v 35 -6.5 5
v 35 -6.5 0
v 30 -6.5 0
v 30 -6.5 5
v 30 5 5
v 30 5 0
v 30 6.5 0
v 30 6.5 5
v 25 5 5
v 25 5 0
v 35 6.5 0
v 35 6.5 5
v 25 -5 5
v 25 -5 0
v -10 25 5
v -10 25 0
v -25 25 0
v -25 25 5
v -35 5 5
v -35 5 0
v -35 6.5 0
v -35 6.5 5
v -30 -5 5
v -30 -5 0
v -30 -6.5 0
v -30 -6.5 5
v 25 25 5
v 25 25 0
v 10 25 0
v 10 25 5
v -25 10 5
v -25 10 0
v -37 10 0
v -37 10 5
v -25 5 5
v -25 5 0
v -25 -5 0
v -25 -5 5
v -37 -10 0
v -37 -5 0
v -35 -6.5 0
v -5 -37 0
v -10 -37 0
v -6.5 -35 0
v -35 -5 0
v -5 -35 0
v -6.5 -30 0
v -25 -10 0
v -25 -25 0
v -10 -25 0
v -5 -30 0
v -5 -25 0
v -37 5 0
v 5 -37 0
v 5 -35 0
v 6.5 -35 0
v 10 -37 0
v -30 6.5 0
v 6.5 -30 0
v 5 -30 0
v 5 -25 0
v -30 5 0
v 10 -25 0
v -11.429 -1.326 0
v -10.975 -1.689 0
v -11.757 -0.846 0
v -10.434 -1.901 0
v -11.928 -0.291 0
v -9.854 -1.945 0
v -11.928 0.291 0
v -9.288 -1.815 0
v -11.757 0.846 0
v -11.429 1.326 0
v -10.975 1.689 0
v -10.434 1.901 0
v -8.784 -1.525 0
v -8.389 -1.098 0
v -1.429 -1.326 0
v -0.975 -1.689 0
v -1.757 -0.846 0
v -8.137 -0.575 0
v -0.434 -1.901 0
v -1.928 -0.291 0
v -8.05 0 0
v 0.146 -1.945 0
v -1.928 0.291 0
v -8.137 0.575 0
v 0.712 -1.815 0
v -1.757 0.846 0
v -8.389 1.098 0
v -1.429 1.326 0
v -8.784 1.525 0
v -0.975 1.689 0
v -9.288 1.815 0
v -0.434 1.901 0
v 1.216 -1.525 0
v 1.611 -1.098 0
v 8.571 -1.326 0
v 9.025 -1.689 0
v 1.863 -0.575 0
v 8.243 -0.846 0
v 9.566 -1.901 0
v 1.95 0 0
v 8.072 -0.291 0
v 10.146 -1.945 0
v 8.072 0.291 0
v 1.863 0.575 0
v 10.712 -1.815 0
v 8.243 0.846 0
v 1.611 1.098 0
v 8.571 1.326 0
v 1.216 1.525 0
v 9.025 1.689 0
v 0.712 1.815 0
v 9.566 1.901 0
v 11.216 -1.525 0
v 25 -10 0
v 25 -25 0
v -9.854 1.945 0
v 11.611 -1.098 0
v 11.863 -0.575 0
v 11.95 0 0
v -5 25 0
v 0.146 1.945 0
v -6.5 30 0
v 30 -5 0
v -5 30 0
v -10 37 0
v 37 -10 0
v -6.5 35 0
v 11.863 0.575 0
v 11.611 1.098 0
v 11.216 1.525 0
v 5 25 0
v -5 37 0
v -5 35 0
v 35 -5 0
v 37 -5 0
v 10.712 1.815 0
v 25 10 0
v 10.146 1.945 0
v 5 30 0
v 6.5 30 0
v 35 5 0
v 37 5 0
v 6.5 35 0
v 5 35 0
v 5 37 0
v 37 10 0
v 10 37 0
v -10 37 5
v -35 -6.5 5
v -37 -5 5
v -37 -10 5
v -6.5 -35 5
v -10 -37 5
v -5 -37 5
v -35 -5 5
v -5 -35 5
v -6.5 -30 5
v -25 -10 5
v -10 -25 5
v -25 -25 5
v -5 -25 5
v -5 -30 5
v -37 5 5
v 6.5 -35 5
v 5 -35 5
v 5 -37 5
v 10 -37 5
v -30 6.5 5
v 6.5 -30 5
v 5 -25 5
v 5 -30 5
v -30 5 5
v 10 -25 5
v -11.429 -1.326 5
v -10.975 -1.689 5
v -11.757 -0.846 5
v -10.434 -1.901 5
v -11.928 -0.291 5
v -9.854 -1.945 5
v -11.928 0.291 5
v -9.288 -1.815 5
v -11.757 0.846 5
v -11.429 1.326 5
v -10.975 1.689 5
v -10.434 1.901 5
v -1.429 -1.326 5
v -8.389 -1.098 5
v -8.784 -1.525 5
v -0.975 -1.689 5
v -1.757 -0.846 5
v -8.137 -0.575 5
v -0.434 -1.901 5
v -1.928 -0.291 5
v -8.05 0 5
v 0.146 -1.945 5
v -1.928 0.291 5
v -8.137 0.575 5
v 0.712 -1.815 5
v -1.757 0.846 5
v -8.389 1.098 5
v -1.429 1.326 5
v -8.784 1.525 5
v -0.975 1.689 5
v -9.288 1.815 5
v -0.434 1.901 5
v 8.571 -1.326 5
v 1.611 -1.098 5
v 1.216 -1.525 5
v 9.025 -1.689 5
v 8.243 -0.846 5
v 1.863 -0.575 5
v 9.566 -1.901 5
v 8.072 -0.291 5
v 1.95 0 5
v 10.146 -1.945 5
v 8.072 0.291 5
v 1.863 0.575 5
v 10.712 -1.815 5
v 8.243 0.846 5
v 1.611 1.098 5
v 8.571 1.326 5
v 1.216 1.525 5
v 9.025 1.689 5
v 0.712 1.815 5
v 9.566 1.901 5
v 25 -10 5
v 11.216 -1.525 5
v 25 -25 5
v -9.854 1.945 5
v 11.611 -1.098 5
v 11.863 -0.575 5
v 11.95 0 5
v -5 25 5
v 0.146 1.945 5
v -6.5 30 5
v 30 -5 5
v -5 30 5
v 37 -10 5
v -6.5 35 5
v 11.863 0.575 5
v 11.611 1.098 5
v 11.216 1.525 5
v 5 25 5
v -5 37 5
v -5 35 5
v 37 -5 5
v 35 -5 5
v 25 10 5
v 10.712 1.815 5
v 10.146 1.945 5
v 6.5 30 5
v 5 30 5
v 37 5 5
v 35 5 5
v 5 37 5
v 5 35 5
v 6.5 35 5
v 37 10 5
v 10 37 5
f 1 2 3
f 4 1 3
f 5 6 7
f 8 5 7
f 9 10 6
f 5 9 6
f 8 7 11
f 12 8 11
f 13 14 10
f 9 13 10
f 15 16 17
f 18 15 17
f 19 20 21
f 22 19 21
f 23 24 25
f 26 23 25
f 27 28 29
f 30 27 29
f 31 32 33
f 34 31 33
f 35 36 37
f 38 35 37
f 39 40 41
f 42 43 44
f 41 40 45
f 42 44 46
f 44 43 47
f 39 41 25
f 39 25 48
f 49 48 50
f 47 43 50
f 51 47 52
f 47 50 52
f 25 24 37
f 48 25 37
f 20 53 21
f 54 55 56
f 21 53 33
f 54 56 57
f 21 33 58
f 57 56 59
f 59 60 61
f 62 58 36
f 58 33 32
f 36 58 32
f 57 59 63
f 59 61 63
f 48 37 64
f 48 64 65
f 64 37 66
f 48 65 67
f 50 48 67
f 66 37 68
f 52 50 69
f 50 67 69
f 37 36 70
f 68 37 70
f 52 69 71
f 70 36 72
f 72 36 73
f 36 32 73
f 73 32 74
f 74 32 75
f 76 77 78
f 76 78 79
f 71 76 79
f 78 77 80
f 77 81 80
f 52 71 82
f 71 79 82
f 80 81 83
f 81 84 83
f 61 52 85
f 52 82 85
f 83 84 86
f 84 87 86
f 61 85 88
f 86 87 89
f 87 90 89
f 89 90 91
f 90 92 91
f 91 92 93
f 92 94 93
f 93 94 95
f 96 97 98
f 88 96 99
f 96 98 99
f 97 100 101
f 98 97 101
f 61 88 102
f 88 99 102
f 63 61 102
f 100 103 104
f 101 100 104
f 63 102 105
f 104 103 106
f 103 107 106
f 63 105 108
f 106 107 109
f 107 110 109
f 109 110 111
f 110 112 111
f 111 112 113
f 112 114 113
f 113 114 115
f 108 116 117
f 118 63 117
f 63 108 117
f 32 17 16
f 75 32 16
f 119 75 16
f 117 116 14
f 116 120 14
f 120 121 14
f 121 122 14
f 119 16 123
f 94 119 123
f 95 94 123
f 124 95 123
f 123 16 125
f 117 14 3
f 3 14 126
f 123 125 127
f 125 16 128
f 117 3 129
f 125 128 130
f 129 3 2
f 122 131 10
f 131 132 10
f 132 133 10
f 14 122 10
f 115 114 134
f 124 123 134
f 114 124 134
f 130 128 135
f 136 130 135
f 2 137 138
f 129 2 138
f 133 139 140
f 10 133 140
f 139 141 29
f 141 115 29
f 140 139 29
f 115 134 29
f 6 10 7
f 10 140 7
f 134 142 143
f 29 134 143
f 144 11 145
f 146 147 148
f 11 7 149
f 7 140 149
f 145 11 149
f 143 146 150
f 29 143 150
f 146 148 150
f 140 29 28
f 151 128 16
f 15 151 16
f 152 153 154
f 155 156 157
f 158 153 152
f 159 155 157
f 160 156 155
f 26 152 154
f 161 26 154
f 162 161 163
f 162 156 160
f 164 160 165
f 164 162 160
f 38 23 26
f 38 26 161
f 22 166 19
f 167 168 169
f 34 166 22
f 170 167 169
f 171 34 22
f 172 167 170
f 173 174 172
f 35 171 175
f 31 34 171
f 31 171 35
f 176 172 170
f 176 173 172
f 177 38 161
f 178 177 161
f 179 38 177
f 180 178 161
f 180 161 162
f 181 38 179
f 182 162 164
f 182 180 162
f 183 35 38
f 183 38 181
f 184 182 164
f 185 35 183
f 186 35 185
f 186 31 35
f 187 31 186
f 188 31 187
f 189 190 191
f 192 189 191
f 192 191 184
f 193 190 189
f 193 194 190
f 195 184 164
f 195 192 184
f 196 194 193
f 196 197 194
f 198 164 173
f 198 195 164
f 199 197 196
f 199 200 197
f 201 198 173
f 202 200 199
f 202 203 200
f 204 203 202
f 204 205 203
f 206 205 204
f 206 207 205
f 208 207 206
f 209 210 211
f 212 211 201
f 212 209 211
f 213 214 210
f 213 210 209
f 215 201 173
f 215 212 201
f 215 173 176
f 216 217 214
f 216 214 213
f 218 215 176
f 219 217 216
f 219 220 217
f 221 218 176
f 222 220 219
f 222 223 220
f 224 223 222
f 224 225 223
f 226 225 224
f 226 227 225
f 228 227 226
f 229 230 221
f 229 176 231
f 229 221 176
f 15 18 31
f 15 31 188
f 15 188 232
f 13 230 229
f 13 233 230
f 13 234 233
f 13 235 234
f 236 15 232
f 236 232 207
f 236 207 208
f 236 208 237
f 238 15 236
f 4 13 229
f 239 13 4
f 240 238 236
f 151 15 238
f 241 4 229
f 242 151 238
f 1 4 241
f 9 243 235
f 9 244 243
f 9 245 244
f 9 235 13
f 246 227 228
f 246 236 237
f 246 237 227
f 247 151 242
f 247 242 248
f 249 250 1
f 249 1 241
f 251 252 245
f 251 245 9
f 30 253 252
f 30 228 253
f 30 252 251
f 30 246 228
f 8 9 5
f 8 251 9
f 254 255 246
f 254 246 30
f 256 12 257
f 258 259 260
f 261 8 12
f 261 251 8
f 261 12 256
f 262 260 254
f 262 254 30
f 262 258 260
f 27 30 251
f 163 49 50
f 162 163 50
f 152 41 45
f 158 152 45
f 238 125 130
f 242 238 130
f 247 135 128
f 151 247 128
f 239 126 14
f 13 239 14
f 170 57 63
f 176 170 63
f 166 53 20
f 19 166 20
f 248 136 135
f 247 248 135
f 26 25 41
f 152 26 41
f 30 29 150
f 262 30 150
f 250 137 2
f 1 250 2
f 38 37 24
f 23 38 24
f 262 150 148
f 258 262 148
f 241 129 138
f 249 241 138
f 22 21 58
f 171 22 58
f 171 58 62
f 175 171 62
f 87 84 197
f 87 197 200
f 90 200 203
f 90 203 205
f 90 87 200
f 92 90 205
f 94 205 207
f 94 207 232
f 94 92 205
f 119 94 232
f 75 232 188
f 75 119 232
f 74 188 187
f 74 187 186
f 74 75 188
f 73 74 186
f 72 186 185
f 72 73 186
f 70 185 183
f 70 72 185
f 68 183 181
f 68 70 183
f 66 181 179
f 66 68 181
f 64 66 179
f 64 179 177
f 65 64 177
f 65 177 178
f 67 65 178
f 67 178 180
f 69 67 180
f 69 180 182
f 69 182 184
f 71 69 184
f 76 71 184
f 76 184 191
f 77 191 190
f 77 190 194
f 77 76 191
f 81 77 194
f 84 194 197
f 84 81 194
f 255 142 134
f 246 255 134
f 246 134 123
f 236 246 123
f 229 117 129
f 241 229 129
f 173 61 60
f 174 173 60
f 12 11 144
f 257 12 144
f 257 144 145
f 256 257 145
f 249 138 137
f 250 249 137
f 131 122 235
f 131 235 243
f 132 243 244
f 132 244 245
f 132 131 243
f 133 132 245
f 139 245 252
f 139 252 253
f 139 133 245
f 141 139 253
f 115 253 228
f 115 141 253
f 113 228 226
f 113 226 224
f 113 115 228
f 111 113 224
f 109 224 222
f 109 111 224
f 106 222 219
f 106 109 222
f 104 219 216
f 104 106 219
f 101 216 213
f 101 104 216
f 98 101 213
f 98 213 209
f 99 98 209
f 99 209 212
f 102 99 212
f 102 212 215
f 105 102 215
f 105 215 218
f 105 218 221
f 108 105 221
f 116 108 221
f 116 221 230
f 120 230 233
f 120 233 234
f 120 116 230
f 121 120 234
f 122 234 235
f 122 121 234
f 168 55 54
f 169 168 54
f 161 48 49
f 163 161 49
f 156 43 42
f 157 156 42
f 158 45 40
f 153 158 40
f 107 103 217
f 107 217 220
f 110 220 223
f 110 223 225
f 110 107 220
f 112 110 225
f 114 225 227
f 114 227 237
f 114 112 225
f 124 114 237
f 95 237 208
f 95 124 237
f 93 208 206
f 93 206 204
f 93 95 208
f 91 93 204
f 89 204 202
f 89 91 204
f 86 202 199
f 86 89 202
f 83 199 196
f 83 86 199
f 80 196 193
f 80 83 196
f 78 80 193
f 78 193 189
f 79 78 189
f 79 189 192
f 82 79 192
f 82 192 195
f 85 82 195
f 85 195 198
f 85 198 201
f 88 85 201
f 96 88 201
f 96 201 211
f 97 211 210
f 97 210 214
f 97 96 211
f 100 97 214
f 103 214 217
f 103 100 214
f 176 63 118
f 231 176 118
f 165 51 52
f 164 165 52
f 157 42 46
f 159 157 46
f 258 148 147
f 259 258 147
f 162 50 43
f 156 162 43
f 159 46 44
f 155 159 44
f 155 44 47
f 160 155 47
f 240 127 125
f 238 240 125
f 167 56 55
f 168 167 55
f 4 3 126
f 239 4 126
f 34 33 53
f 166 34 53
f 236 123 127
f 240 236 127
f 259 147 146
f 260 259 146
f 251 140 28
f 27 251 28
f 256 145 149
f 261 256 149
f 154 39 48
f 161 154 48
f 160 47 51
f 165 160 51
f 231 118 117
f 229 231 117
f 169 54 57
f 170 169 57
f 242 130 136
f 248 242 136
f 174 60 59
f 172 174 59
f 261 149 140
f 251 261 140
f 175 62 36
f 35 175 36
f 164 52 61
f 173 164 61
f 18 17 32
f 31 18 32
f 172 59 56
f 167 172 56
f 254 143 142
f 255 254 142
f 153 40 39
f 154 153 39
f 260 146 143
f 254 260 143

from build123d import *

# Parameters (mm, degrees)
ESQUISSE1_R        = 1.95
BOSS_EXTRU_1_DEPTH = 5


with BuildPart() as part:
    # Esquisse1 → Boss.-Extru.1 (new body)
    with BuildSketch(Plane.XY):
        Polygon((-10, 25), (-25, 25), (-25, 10), (-30, 10), (-37, 10), (-37, 5), (-35, 5), (-35, 6.5), (-30, 6.5), (-30, 5), (-25, 5), (-25, 0), (-25, -5), (-30, -5), (-30, -6.5), (-35, -6.5), (-35, -5), (-37, -5), (-37, -10), (-30, -10), (-25, -10), (-25, -25), (-10, -25), (-10, -30), (-10, -37), (-5, -37), (-5, -35), (-6.5, -35), (-6.5, -30), (-5, -30), (-5, -25), (0, -25), (5, -25), (5, -30), (6.5, -30), (6.5, -35), (5, -35), (5, -37), (10, -37), (10, -30), (10, -25), (25, -25), (25, -10), (30, -10), (37, -10), (37, -5), (35, -5), (35, -6.5), (30, -6.5), (30, -5), (25, -5), (25, 0), (25, 5), (30, 5), (30, 6.5), (35, 6.5), (35, 5), (37, 5), (37, 10), (30, 10), (25, 10), (25, 25), (10, 25), (10, 30), (10, 37), (5, 37), (5, 35), (6.5, 35), (6.5, 30), (5, 30), (5, 25), (0, 25), (-5, 25), (-5, 30), (-6.5, 30), (-6.5, 35), (-5, 35), (-5, 37), (-10, 37), (-10, 30), align=None)
        with Locations((-10, 0)):
            Circle(ESQUISSE1_R, mode=Mode.SUBTRACT)
        Circle(ESQUISSE1_R, mode=Mode.SUBTRACT)
        with Locations((10, 0)):
            Circle(ESQUISSE1_R, mode=Mode.SUBTRACT)
    extrude(amount=BOSS_EXTRU_1_DEPTH)


solid = part.part
